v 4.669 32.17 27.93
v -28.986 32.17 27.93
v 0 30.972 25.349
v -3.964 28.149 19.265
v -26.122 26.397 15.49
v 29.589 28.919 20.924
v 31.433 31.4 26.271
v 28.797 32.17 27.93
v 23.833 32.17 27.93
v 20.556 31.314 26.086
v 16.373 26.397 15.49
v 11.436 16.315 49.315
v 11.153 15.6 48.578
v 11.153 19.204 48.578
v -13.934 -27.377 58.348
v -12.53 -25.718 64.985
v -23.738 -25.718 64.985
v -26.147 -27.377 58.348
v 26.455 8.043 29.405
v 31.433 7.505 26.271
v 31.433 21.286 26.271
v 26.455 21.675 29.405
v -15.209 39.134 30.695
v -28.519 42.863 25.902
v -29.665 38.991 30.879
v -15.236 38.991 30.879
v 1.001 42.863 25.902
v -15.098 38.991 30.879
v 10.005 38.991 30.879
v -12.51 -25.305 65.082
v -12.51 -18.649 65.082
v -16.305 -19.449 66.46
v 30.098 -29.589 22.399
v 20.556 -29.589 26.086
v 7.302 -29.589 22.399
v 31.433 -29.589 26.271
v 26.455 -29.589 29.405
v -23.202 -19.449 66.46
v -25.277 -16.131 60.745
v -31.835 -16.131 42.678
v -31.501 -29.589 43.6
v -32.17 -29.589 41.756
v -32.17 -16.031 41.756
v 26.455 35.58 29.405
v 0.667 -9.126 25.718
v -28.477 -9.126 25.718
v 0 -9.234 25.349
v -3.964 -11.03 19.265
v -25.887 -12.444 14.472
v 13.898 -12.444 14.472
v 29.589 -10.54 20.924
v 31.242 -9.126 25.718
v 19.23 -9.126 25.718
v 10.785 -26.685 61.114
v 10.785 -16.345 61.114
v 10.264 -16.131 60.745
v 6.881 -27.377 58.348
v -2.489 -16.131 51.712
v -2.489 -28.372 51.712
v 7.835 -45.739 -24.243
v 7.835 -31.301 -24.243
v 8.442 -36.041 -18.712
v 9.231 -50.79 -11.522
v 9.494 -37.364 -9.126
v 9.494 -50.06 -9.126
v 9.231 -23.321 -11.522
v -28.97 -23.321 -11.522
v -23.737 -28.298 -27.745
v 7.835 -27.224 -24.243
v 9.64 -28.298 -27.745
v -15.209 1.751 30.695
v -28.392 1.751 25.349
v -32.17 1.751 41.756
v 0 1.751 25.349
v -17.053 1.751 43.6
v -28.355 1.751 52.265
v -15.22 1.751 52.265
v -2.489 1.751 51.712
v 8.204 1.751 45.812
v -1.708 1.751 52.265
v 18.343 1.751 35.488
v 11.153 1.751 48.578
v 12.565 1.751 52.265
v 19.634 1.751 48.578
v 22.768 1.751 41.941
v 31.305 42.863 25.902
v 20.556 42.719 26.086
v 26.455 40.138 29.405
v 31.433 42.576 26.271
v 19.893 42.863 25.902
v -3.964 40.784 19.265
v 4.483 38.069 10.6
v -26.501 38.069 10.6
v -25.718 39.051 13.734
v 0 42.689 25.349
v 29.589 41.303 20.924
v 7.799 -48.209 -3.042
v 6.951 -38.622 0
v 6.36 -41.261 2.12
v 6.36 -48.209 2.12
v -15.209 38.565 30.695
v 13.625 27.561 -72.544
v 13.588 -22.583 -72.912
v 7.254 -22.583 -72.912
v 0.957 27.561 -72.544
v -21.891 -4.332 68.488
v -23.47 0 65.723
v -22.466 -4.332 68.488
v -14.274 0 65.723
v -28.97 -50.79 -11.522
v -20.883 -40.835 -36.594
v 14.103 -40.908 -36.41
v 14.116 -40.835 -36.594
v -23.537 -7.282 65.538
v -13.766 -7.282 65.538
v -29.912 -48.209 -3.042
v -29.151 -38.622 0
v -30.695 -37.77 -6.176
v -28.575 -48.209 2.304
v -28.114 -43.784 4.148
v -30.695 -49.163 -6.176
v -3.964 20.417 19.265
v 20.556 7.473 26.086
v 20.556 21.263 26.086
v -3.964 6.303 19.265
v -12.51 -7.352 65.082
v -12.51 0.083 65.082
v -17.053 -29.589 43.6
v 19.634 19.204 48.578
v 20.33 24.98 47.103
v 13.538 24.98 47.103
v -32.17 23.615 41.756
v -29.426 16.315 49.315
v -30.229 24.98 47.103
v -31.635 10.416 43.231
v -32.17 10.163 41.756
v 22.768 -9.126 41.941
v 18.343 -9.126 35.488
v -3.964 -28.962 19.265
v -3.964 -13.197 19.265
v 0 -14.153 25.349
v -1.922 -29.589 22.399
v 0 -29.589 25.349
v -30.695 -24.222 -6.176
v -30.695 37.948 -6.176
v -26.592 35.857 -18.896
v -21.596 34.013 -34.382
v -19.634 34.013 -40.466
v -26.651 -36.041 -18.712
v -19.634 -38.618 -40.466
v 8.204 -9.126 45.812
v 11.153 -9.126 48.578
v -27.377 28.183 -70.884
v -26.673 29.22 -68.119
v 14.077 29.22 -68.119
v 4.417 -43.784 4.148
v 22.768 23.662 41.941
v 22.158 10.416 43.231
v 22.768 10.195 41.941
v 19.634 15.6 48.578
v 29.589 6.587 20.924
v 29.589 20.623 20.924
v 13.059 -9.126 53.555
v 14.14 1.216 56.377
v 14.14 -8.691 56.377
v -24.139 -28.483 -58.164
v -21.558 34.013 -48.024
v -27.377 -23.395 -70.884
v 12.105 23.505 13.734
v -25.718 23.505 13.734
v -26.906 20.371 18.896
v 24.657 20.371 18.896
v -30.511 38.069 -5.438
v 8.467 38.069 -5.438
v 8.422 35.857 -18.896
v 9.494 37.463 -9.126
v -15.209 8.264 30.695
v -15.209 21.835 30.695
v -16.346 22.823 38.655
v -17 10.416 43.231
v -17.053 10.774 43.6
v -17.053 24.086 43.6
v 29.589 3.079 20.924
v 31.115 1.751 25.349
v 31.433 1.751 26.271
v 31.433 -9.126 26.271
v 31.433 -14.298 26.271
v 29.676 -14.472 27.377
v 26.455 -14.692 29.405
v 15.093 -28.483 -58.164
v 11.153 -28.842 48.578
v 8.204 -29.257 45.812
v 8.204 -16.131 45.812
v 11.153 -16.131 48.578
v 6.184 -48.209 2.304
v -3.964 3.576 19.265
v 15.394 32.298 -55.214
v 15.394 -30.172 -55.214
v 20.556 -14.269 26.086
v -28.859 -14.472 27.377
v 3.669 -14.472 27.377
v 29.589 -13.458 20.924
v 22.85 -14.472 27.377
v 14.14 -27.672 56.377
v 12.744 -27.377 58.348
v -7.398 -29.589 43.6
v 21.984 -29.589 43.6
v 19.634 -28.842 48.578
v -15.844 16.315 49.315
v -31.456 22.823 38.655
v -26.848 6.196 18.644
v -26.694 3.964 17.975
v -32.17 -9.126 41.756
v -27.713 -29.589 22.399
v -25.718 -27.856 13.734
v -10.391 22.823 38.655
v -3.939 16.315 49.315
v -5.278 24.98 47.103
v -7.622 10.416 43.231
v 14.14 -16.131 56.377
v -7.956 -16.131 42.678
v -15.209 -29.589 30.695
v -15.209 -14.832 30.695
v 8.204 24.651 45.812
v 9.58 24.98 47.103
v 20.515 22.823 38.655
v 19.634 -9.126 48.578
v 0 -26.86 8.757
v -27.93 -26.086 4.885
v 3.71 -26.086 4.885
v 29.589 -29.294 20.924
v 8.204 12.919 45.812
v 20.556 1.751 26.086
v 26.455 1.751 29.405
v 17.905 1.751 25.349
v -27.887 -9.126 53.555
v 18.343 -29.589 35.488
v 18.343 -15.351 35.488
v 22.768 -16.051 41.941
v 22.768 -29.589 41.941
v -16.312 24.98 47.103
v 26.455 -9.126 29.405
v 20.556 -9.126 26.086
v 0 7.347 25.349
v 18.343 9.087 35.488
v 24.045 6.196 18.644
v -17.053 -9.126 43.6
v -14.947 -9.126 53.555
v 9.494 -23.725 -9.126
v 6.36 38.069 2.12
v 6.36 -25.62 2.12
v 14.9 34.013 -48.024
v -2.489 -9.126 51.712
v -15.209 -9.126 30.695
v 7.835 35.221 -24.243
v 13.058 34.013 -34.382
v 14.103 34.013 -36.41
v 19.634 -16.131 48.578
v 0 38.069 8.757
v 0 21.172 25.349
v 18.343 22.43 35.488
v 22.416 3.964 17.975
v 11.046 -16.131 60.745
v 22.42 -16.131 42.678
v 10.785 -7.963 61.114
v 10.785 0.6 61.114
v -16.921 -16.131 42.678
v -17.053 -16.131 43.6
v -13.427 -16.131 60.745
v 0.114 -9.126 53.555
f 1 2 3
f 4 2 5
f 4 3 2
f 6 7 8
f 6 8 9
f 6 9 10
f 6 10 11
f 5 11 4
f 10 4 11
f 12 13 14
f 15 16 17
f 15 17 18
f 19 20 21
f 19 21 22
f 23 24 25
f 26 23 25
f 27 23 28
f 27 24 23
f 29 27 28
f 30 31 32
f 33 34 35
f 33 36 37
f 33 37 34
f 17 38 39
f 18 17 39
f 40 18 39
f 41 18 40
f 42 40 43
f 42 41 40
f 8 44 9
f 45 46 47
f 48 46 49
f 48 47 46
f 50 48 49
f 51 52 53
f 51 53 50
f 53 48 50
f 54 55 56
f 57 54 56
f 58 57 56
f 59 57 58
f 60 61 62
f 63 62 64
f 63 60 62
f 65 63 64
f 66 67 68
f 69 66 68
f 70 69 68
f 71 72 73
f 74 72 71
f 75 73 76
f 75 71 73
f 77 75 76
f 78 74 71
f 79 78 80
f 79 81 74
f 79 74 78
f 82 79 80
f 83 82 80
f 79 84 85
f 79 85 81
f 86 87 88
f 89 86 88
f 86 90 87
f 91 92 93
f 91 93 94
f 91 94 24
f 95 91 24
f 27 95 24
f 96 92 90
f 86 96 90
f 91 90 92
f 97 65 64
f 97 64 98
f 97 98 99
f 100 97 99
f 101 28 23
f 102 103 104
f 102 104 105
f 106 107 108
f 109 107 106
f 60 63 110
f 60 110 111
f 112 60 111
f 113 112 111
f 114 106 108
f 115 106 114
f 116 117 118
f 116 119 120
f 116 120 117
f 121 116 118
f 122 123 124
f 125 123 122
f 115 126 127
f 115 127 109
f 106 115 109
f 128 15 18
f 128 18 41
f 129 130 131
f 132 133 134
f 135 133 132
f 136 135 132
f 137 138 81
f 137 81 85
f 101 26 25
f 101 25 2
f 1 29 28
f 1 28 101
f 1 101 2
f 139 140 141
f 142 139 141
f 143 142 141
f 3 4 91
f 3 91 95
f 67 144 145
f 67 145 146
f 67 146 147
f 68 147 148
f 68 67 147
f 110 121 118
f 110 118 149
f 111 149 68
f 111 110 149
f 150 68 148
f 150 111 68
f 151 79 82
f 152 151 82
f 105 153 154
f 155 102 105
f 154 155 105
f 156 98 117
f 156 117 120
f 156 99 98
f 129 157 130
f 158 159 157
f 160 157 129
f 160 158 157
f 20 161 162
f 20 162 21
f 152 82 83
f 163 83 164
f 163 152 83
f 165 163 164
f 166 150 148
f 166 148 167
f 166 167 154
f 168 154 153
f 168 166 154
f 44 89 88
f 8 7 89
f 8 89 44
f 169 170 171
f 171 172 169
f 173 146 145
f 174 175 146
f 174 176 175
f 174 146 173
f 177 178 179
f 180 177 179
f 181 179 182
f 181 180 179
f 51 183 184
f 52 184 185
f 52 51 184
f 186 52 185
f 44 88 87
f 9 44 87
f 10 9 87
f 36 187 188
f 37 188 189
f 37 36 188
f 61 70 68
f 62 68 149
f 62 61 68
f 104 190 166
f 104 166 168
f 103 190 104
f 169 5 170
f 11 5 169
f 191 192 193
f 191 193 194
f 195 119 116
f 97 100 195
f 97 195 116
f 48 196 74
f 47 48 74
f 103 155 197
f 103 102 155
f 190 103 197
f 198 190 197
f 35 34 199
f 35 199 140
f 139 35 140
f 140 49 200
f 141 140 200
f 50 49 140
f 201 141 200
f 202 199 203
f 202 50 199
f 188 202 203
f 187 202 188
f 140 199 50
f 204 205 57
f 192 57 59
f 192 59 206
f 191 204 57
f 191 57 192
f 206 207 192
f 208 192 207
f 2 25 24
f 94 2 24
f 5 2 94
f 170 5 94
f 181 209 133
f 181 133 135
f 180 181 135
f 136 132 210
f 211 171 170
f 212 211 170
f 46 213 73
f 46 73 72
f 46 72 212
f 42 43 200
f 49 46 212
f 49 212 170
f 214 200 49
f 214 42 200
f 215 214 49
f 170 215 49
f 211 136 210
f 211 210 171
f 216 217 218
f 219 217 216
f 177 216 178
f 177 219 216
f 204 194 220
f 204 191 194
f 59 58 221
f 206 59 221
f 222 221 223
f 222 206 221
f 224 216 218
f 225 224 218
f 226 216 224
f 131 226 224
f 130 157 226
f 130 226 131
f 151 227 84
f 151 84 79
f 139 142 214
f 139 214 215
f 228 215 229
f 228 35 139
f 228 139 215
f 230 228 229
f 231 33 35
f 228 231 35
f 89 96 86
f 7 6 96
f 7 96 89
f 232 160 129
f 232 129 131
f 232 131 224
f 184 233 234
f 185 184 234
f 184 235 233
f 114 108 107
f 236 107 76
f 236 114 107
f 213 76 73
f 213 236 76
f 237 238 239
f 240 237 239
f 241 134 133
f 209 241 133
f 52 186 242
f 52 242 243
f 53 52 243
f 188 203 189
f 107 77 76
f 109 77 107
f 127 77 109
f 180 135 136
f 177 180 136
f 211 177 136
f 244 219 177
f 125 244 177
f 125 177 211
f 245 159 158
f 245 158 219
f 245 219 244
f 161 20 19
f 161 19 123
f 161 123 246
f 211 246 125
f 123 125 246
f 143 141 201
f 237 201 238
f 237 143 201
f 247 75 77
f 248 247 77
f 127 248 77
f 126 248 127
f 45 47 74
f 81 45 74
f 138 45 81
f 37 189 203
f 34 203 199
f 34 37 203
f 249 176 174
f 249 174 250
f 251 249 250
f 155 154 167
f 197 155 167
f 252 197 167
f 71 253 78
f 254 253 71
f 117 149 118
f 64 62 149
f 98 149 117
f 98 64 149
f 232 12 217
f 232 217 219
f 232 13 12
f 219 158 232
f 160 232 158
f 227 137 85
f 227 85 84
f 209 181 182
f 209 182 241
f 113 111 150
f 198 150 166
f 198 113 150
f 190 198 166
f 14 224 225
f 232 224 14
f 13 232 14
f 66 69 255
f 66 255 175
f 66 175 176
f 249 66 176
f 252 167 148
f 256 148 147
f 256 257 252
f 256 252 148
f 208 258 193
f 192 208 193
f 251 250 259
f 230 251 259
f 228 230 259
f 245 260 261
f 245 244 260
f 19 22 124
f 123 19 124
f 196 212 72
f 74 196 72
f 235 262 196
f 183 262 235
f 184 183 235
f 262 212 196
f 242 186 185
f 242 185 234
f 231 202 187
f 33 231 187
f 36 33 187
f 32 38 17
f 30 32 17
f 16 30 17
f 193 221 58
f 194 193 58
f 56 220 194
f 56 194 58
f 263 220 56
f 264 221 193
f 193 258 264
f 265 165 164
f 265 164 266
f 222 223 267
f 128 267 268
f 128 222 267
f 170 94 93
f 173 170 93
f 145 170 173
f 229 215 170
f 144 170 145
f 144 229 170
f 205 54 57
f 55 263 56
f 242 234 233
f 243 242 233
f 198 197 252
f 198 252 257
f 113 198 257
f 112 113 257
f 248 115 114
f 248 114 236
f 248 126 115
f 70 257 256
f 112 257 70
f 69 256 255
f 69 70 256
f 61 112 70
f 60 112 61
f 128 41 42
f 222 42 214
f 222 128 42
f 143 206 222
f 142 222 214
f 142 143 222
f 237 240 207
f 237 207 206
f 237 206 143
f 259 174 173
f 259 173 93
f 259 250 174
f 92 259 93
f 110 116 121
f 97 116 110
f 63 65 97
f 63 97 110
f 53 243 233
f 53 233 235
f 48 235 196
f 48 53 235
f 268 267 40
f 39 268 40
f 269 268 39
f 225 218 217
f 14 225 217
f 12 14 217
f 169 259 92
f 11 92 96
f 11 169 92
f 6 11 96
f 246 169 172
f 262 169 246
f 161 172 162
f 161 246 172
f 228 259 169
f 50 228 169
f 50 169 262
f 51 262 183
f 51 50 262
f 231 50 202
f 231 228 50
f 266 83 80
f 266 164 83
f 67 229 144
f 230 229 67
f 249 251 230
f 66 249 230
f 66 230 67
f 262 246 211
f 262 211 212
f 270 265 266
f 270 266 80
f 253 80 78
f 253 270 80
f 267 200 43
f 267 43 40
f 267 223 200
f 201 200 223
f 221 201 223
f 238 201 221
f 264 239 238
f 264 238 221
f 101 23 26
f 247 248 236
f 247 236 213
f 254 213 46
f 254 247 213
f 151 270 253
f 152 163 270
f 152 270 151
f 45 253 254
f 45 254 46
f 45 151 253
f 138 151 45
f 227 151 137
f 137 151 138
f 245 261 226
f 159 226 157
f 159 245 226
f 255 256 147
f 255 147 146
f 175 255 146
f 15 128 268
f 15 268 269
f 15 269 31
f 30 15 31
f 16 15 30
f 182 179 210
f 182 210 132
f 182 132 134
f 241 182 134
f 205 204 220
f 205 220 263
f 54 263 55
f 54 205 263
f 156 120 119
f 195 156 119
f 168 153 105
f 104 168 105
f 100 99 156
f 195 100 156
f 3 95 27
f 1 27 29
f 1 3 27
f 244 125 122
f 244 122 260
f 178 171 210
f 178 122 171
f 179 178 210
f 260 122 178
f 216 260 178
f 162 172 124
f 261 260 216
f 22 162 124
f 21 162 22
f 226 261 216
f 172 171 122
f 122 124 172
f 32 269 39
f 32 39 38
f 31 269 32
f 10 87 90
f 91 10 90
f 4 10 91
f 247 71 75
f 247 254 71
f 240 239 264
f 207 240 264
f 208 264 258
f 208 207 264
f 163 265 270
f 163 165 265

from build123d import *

# Parameters (mm, degrees)
F1_DEPTH = 50.8
F3_DEPTH = 88.9


with BuildPart() as f1:
    # F0 (on Front) → F1 (new body, symmetric)
    with BuildSketch(Plane.XZ):
        Polygon((-19.63379, -40.465888), (-27.376695, -70.884436), (13.550079, -73.28105), (15.393632, -55.214275), (14.103146, -36.410082), (7.835083, -24.24266), (9.494272, -9.125564), (6.36024, 2.120081), (0, 8.756855), (29.588955, 20.924276), (31.432502, 26.270565), (26.454922, 29.404595), (20.555561, 26.086211), (-3.963629, 19.26508), (0, 25.34879), (18.343307, 35.488307), (22.767823, 41.940726), (19.633792, 48.577502), (8.203791, 45.812178), (11.153466, 48.577502), (14.139802, 56.377097), (10.784757, 61.113629), (-2.488789, 51.711533), (-15.209274, 30.695081), (-17.052822, 43.599918), (-12.509717, 65.082186), (-22.399113, 68.672173), (-32.169919, 41.756369), (-25.717501, 13.734437), (-30.695081, -6.175887), align=None)
    extrude(amount=F1_DEPTH, both=True)

    # F2 (on Right) → F3 (intersect, symmetric)
    with BuildSketch(Plane.YZ):
        Polygon((-28.482823, -58.163952), (-22.583468, -72.912343), (27.56105, -72.543629), (29.220244, -68.119116), (34.013465, -48.024435), (34.013465, -34.382179), (35.857018, -18.896371), (38.069274, -5.438467), (38.069274, 10.600403), (42.862501, 25.901856), (38.991049, 30.879436), (32.169919, 27.929757), (26.396504, 15.489846), (23.505243, 13.734437), (20.37121, 18.896371), (22.823287, 38.655246), (24.980079, 47.10266), (16.315402, 49.314924), (10.416048, 43.231212), (6.196184, 18.644363), (3.963629, 17.974596), (1.751371, 25.34879), (1.751371, 52.264594), (0, 65.722503), (-4.332338, 68.487823), (-7.282016, 65.538146), (-9.125565, 53.555083), (-9.125565, 25.717501), (-12.443951, 14.471854), (-14.471856, 27.376693), (-16.131047, 42.678144), (-16.131047, 60.744923), (-19.449435, 66.459917), (-25.717501, 64.985082), (-27.376695, 58.348306), (-29.588953, 43.599918), (-29.588953, 22.399114), (-26.086209, 4.885403), (-23.320887, -11.522178), (-28.298467, -27.745403), (-36.041372, -18.712016), (-38.622338, 0), (-43.784276, 4.147984), (-48.208792, 2.304435), (-48.208792, -3.041855), (-50.789759, -11.522178), (-40.834598, -36.594436), align=None)
    extrude(amount=F3_DEPTH, both=True, mode=Mode.INTERSECT)


solid = f1.part
